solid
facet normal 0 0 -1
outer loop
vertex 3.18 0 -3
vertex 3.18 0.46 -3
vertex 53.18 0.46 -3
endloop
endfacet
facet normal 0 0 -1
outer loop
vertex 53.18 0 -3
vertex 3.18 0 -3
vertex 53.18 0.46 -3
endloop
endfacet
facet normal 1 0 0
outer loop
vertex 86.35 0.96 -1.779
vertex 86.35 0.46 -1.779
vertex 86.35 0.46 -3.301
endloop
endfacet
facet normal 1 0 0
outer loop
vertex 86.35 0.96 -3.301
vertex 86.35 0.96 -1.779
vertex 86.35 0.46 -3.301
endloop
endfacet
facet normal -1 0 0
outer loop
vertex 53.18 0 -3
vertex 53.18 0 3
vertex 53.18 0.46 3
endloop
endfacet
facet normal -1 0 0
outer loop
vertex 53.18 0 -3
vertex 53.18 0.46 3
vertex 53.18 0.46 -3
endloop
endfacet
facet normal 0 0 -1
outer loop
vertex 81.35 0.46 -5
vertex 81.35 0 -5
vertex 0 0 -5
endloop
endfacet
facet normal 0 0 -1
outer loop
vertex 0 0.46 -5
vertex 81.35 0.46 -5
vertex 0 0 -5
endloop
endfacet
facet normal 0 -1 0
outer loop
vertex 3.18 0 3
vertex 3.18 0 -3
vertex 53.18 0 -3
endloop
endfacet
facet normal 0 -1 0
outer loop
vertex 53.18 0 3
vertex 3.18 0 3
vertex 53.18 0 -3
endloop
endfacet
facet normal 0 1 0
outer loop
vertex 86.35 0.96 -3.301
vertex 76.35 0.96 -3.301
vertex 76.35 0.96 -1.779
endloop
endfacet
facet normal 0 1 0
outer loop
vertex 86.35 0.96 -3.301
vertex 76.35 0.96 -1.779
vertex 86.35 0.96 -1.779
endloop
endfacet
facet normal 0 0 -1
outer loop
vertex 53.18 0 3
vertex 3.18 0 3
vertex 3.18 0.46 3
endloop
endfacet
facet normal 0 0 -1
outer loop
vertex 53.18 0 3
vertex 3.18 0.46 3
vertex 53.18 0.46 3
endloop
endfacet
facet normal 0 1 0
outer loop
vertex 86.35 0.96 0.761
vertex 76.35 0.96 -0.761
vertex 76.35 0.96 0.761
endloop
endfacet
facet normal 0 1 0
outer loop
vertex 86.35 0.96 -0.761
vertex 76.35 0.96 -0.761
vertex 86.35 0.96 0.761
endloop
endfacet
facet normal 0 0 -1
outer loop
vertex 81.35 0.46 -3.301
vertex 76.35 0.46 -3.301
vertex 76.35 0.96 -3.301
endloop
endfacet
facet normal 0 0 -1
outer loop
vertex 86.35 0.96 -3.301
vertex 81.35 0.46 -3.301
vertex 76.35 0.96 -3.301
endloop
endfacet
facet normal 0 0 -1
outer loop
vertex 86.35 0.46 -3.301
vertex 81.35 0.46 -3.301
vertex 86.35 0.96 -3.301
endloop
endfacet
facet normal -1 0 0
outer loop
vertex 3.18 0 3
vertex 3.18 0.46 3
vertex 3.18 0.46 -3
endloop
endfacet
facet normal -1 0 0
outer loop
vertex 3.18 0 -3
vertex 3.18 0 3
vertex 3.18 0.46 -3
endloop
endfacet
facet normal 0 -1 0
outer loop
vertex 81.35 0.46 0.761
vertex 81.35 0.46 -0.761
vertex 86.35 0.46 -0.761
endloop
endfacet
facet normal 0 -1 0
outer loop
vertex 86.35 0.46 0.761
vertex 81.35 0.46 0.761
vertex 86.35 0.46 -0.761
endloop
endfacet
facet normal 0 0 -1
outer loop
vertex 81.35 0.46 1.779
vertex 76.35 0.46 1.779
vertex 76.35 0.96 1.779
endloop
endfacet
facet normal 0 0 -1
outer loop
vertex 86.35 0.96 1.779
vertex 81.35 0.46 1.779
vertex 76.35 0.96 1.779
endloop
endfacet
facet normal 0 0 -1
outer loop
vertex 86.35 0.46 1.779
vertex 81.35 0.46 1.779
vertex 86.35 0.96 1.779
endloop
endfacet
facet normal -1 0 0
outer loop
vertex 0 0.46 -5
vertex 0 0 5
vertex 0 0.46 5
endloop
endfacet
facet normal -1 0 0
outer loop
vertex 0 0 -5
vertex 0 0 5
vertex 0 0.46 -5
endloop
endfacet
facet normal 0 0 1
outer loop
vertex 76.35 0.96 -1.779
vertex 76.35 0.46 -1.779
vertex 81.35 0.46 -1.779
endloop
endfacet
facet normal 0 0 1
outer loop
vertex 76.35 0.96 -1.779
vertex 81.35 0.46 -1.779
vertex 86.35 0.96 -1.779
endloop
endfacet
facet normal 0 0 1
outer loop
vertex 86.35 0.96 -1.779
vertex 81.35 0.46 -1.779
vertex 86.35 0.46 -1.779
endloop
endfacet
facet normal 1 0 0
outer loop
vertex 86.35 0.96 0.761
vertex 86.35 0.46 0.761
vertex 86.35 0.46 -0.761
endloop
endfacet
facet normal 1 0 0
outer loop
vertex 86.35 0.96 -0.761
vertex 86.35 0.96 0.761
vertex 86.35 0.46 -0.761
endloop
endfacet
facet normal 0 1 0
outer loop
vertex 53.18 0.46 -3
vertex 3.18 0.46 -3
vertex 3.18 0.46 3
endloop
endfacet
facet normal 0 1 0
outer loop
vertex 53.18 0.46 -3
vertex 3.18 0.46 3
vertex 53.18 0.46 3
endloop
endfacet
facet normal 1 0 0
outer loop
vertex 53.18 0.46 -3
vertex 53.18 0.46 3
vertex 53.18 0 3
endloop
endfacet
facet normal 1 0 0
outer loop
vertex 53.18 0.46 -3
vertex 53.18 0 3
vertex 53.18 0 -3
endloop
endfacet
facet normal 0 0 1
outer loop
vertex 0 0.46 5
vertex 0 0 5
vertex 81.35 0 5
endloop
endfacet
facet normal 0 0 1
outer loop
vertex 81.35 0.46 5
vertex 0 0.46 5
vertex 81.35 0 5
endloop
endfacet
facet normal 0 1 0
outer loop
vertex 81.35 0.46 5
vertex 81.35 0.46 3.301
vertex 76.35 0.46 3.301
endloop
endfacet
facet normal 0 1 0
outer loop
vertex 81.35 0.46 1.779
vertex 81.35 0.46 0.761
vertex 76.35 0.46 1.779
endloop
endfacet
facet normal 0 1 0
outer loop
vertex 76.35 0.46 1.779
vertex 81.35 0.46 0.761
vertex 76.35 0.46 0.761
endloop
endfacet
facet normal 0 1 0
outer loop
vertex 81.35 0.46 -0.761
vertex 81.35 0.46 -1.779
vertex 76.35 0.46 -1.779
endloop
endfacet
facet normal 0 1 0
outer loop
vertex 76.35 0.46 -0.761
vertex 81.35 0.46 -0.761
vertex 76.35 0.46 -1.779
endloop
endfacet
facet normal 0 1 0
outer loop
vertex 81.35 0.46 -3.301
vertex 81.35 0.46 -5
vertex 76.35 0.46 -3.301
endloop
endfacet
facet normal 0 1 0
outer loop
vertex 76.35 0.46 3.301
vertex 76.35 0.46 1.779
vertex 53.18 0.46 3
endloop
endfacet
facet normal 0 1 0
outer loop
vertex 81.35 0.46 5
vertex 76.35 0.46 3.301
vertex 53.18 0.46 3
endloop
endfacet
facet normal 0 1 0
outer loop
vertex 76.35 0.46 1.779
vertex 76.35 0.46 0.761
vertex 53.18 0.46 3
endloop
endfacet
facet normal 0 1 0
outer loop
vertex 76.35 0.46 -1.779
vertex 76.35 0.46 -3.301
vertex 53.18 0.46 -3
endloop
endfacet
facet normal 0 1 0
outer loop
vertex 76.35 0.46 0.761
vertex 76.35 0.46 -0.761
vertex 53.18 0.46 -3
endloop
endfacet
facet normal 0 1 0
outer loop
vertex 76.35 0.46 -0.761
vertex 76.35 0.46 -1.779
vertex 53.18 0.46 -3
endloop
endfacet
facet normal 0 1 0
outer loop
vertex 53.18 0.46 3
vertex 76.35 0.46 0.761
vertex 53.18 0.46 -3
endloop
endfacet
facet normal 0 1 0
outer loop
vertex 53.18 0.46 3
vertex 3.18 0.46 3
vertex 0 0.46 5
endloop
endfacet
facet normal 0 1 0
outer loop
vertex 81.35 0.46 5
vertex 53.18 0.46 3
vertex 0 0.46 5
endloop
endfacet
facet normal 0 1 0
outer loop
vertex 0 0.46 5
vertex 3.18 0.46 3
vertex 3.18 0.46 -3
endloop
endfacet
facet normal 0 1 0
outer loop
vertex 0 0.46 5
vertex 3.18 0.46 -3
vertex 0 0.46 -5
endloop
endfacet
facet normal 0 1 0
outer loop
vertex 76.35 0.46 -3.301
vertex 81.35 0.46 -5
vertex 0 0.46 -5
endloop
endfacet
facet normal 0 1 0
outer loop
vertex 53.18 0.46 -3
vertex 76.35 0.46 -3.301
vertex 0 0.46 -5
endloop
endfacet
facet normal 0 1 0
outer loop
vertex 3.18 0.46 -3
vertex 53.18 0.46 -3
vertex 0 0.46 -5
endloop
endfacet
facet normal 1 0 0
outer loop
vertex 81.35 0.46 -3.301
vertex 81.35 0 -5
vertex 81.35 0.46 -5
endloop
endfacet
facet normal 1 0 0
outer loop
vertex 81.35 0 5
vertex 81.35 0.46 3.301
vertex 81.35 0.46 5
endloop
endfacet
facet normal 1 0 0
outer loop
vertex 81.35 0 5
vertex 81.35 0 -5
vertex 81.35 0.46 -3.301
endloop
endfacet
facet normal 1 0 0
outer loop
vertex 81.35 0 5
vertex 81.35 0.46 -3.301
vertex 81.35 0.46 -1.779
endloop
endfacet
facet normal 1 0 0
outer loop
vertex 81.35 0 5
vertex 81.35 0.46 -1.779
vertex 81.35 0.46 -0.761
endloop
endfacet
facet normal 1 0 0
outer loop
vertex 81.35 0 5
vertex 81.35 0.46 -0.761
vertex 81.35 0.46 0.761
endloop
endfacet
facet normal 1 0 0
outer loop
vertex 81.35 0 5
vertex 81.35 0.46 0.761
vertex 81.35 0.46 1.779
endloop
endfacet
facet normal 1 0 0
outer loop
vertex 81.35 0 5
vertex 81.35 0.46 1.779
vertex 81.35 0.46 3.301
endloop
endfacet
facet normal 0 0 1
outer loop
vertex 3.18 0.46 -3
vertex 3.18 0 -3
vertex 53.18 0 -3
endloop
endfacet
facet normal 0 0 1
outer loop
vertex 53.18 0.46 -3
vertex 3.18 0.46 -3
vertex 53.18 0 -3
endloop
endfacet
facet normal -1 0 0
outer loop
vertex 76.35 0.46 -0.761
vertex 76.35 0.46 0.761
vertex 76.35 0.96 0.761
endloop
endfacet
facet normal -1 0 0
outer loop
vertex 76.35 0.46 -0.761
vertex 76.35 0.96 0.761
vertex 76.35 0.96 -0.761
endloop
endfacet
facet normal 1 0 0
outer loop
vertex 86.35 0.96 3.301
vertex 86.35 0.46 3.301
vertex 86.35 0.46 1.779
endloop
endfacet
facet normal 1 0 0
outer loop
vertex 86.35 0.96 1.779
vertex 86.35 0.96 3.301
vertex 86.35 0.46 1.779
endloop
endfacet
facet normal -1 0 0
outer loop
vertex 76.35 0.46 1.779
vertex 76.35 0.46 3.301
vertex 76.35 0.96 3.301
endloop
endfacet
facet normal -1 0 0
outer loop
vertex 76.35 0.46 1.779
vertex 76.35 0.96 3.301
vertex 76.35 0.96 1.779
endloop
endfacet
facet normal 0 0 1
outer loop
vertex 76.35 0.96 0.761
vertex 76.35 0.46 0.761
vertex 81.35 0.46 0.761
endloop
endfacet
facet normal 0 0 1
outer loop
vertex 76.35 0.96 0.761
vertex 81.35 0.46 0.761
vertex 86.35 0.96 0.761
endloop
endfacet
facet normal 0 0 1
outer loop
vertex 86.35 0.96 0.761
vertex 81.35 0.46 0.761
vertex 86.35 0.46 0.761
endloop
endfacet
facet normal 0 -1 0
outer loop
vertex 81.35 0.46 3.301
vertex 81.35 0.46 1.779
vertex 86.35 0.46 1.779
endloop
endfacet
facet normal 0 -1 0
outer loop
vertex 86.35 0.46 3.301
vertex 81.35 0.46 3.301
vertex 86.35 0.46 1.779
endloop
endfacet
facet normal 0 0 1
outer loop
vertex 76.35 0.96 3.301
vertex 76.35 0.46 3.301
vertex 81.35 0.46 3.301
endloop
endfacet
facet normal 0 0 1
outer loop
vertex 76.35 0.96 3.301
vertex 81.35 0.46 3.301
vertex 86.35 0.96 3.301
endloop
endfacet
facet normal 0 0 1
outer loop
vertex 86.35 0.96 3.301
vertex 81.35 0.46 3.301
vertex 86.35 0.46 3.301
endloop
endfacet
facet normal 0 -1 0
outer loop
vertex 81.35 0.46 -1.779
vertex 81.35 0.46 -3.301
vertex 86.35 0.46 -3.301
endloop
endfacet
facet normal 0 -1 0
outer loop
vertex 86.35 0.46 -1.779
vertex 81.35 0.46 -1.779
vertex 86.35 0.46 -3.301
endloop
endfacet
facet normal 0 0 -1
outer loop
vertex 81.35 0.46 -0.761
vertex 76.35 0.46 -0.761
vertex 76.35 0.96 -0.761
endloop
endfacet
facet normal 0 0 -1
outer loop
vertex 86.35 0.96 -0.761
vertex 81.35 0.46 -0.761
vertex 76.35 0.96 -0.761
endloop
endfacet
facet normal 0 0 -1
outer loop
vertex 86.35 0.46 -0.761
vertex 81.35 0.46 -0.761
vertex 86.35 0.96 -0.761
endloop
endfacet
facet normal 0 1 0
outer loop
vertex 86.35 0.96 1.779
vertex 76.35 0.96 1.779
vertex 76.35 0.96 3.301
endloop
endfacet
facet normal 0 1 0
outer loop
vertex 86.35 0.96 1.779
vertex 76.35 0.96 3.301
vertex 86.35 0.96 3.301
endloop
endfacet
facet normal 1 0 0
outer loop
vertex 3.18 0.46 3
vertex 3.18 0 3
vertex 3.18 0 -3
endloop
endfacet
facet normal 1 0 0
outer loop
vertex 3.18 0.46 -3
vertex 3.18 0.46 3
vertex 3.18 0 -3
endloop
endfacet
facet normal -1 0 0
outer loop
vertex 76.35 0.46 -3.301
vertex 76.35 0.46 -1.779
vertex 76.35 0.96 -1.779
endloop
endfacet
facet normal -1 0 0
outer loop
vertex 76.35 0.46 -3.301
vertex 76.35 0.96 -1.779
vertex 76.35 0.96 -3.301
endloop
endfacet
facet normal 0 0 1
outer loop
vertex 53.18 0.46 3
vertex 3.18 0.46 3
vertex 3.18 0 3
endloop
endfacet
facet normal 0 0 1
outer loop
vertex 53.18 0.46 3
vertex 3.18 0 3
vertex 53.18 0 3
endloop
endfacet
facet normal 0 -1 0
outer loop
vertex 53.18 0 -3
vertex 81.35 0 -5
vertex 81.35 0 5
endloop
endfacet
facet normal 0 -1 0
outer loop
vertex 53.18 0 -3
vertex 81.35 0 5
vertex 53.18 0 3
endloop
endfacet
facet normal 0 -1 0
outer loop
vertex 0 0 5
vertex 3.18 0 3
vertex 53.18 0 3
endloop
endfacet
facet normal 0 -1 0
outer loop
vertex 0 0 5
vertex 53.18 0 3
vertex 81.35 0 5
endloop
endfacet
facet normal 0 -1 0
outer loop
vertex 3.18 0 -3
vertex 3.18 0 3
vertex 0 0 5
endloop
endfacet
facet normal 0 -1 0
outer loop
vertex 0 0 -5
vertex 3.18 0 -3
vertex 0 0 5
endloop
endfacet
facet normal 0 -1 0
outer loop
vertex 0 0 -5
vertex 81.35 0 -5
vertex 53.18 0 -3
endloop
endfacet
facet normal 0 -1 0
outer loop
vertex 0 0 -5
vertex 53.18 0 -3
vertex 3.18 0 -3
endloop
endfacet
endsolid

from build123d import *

# Parameters (mm, degrees)
SKETCH1_W           = 50
SKETCH1_H           = 6
BOSS_EXTRUDE1_DEPTH = 0.46
SKETCH2_W           = 50
SKETCH2_H           = 6
BOSS_EXTRUDE2_DEPTH = 0.46
SKETCH3_W           = 10
SKETCH3_H           = 1.52217223
BOSS_EXTRUDE3_DEPTH = 0.5


with BuildPart() as part:
    # Sketch1 → Boss-Extrude1 (new body)
    with BuildSketch(Plane(origin=(0, 0, 0), x_dir=(1, 0, 0), z_dir=(0, 1, 0))):
        Polygon((0, 5), (56.35, 5), (81.35, 5), (81.35, -5), (56.35, -5), (0, -5), align=None)
        with Locations((28.18, 0)):
            Rectangle(SKETCH1_W, SKETCH1_H, mode=Mode.SUBTRACT)
    extrude(amount=BOSS_EXTRUDE1_DEPTH)

    # Sketch3 → Boss-Extrude3 (add)
    with BuildSketch(Plane(origin=(0, 0.46, 0), x_dir=(1, 0, 0), z_dir=(0, 1, 0))):
        with Locations((81.35, 2.54)):
            Rectangle(SKETCH3_W, SKETCH3_H)
        with Locations((81.35, 0)):
            Rectangle(SKETCH3_W, SKETCH3_H)
        with Locations((81.35, -2.54)):
            Rectangle(SKETCH3_W, SKETCH3_H)
    extrude(amount=BOSS_EXTRUDE3_DEPTH)


with BuildPart() as body_2:
    # Sketch2 → Boss-Extrude2 (new body)
    with BuildSketch(Plane(origin=(0, 0.46, 0), x_dir=(1, 0, 0), z_dir=(0, 1, 0))):
        with Locations((28.18, 0)):
            Rectangle(SKETCH2_W, SKETCH2_H)
    extrude(amount=-BOSS_EXTRUDE2_DEPTH)


solid = Compound([part.part, body_2.part])
